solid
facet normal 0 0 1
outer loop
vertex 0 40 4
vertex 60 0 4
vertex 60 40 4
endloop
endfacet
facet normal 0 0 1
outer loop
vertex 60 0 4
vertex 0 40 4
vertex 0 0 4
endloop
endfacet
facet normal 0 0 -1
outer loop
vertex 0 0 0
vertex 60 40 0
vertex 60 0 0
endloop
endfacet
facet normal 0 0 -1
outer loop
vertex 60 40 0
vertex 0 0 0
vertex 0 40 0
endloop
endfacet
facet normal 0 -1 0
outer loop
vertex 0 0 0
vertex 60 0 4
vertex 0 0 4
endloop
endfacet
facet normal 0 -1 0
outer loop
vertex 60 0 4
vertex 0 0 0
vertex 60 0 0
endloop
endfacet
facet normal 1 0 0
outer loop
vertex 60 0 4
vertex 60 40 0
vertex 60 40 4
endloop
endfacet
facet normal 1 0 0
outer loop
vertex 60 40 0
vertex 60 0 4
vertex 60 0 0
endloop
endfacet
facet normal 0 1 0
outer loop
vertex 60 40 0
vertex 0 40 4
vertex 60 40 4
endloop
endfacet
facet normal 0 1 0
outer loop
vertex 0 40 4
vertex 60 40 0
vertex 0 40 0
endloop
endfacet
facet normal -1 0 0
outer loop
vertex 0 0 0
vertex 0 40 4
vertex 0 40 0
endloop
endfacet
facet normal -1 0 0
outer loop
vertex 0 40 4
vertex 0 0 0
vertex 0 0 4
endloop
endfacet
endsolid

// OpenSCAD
// Project 01 - Aerospace Mounting Bracket
// Stage: Baseline Verification Geometry
//
// Purpose: plain flat cantilever plate for Euler-Bernoulli analytical
// verification (stress + tip deflection) and mesh convergence study.
// This geometry deliberately excludes holes, fillet, and gusset -
// those are introduced in later geometry files after this baseline
// is verified against analytical theory.
//
// Idealization:
//   - Root (x=0 plane): fixed (encastre) boundary condition, applied
//     at the solver stage, not represented here.
//   - Free tip (x=L plane): statically equivalent transverse point
//     force of 235.44 N applied at the free-edge centroid
//     (x=L, y=0, z=h/2) during FEA - also applied at solver stage.
//
// Axes:
//   x - cantilever / load-path direction (length L)
//   y - flange width direction (width b)
//   z - thickness direction (height h)

// ---- Verification geometry parameters (mm) ----
L = 60;   // cantilever length, load-path direction
b = 40;   // flange width
h = 4;    // thickness

// ---- Geometry ----
cube([L, b, h]);
